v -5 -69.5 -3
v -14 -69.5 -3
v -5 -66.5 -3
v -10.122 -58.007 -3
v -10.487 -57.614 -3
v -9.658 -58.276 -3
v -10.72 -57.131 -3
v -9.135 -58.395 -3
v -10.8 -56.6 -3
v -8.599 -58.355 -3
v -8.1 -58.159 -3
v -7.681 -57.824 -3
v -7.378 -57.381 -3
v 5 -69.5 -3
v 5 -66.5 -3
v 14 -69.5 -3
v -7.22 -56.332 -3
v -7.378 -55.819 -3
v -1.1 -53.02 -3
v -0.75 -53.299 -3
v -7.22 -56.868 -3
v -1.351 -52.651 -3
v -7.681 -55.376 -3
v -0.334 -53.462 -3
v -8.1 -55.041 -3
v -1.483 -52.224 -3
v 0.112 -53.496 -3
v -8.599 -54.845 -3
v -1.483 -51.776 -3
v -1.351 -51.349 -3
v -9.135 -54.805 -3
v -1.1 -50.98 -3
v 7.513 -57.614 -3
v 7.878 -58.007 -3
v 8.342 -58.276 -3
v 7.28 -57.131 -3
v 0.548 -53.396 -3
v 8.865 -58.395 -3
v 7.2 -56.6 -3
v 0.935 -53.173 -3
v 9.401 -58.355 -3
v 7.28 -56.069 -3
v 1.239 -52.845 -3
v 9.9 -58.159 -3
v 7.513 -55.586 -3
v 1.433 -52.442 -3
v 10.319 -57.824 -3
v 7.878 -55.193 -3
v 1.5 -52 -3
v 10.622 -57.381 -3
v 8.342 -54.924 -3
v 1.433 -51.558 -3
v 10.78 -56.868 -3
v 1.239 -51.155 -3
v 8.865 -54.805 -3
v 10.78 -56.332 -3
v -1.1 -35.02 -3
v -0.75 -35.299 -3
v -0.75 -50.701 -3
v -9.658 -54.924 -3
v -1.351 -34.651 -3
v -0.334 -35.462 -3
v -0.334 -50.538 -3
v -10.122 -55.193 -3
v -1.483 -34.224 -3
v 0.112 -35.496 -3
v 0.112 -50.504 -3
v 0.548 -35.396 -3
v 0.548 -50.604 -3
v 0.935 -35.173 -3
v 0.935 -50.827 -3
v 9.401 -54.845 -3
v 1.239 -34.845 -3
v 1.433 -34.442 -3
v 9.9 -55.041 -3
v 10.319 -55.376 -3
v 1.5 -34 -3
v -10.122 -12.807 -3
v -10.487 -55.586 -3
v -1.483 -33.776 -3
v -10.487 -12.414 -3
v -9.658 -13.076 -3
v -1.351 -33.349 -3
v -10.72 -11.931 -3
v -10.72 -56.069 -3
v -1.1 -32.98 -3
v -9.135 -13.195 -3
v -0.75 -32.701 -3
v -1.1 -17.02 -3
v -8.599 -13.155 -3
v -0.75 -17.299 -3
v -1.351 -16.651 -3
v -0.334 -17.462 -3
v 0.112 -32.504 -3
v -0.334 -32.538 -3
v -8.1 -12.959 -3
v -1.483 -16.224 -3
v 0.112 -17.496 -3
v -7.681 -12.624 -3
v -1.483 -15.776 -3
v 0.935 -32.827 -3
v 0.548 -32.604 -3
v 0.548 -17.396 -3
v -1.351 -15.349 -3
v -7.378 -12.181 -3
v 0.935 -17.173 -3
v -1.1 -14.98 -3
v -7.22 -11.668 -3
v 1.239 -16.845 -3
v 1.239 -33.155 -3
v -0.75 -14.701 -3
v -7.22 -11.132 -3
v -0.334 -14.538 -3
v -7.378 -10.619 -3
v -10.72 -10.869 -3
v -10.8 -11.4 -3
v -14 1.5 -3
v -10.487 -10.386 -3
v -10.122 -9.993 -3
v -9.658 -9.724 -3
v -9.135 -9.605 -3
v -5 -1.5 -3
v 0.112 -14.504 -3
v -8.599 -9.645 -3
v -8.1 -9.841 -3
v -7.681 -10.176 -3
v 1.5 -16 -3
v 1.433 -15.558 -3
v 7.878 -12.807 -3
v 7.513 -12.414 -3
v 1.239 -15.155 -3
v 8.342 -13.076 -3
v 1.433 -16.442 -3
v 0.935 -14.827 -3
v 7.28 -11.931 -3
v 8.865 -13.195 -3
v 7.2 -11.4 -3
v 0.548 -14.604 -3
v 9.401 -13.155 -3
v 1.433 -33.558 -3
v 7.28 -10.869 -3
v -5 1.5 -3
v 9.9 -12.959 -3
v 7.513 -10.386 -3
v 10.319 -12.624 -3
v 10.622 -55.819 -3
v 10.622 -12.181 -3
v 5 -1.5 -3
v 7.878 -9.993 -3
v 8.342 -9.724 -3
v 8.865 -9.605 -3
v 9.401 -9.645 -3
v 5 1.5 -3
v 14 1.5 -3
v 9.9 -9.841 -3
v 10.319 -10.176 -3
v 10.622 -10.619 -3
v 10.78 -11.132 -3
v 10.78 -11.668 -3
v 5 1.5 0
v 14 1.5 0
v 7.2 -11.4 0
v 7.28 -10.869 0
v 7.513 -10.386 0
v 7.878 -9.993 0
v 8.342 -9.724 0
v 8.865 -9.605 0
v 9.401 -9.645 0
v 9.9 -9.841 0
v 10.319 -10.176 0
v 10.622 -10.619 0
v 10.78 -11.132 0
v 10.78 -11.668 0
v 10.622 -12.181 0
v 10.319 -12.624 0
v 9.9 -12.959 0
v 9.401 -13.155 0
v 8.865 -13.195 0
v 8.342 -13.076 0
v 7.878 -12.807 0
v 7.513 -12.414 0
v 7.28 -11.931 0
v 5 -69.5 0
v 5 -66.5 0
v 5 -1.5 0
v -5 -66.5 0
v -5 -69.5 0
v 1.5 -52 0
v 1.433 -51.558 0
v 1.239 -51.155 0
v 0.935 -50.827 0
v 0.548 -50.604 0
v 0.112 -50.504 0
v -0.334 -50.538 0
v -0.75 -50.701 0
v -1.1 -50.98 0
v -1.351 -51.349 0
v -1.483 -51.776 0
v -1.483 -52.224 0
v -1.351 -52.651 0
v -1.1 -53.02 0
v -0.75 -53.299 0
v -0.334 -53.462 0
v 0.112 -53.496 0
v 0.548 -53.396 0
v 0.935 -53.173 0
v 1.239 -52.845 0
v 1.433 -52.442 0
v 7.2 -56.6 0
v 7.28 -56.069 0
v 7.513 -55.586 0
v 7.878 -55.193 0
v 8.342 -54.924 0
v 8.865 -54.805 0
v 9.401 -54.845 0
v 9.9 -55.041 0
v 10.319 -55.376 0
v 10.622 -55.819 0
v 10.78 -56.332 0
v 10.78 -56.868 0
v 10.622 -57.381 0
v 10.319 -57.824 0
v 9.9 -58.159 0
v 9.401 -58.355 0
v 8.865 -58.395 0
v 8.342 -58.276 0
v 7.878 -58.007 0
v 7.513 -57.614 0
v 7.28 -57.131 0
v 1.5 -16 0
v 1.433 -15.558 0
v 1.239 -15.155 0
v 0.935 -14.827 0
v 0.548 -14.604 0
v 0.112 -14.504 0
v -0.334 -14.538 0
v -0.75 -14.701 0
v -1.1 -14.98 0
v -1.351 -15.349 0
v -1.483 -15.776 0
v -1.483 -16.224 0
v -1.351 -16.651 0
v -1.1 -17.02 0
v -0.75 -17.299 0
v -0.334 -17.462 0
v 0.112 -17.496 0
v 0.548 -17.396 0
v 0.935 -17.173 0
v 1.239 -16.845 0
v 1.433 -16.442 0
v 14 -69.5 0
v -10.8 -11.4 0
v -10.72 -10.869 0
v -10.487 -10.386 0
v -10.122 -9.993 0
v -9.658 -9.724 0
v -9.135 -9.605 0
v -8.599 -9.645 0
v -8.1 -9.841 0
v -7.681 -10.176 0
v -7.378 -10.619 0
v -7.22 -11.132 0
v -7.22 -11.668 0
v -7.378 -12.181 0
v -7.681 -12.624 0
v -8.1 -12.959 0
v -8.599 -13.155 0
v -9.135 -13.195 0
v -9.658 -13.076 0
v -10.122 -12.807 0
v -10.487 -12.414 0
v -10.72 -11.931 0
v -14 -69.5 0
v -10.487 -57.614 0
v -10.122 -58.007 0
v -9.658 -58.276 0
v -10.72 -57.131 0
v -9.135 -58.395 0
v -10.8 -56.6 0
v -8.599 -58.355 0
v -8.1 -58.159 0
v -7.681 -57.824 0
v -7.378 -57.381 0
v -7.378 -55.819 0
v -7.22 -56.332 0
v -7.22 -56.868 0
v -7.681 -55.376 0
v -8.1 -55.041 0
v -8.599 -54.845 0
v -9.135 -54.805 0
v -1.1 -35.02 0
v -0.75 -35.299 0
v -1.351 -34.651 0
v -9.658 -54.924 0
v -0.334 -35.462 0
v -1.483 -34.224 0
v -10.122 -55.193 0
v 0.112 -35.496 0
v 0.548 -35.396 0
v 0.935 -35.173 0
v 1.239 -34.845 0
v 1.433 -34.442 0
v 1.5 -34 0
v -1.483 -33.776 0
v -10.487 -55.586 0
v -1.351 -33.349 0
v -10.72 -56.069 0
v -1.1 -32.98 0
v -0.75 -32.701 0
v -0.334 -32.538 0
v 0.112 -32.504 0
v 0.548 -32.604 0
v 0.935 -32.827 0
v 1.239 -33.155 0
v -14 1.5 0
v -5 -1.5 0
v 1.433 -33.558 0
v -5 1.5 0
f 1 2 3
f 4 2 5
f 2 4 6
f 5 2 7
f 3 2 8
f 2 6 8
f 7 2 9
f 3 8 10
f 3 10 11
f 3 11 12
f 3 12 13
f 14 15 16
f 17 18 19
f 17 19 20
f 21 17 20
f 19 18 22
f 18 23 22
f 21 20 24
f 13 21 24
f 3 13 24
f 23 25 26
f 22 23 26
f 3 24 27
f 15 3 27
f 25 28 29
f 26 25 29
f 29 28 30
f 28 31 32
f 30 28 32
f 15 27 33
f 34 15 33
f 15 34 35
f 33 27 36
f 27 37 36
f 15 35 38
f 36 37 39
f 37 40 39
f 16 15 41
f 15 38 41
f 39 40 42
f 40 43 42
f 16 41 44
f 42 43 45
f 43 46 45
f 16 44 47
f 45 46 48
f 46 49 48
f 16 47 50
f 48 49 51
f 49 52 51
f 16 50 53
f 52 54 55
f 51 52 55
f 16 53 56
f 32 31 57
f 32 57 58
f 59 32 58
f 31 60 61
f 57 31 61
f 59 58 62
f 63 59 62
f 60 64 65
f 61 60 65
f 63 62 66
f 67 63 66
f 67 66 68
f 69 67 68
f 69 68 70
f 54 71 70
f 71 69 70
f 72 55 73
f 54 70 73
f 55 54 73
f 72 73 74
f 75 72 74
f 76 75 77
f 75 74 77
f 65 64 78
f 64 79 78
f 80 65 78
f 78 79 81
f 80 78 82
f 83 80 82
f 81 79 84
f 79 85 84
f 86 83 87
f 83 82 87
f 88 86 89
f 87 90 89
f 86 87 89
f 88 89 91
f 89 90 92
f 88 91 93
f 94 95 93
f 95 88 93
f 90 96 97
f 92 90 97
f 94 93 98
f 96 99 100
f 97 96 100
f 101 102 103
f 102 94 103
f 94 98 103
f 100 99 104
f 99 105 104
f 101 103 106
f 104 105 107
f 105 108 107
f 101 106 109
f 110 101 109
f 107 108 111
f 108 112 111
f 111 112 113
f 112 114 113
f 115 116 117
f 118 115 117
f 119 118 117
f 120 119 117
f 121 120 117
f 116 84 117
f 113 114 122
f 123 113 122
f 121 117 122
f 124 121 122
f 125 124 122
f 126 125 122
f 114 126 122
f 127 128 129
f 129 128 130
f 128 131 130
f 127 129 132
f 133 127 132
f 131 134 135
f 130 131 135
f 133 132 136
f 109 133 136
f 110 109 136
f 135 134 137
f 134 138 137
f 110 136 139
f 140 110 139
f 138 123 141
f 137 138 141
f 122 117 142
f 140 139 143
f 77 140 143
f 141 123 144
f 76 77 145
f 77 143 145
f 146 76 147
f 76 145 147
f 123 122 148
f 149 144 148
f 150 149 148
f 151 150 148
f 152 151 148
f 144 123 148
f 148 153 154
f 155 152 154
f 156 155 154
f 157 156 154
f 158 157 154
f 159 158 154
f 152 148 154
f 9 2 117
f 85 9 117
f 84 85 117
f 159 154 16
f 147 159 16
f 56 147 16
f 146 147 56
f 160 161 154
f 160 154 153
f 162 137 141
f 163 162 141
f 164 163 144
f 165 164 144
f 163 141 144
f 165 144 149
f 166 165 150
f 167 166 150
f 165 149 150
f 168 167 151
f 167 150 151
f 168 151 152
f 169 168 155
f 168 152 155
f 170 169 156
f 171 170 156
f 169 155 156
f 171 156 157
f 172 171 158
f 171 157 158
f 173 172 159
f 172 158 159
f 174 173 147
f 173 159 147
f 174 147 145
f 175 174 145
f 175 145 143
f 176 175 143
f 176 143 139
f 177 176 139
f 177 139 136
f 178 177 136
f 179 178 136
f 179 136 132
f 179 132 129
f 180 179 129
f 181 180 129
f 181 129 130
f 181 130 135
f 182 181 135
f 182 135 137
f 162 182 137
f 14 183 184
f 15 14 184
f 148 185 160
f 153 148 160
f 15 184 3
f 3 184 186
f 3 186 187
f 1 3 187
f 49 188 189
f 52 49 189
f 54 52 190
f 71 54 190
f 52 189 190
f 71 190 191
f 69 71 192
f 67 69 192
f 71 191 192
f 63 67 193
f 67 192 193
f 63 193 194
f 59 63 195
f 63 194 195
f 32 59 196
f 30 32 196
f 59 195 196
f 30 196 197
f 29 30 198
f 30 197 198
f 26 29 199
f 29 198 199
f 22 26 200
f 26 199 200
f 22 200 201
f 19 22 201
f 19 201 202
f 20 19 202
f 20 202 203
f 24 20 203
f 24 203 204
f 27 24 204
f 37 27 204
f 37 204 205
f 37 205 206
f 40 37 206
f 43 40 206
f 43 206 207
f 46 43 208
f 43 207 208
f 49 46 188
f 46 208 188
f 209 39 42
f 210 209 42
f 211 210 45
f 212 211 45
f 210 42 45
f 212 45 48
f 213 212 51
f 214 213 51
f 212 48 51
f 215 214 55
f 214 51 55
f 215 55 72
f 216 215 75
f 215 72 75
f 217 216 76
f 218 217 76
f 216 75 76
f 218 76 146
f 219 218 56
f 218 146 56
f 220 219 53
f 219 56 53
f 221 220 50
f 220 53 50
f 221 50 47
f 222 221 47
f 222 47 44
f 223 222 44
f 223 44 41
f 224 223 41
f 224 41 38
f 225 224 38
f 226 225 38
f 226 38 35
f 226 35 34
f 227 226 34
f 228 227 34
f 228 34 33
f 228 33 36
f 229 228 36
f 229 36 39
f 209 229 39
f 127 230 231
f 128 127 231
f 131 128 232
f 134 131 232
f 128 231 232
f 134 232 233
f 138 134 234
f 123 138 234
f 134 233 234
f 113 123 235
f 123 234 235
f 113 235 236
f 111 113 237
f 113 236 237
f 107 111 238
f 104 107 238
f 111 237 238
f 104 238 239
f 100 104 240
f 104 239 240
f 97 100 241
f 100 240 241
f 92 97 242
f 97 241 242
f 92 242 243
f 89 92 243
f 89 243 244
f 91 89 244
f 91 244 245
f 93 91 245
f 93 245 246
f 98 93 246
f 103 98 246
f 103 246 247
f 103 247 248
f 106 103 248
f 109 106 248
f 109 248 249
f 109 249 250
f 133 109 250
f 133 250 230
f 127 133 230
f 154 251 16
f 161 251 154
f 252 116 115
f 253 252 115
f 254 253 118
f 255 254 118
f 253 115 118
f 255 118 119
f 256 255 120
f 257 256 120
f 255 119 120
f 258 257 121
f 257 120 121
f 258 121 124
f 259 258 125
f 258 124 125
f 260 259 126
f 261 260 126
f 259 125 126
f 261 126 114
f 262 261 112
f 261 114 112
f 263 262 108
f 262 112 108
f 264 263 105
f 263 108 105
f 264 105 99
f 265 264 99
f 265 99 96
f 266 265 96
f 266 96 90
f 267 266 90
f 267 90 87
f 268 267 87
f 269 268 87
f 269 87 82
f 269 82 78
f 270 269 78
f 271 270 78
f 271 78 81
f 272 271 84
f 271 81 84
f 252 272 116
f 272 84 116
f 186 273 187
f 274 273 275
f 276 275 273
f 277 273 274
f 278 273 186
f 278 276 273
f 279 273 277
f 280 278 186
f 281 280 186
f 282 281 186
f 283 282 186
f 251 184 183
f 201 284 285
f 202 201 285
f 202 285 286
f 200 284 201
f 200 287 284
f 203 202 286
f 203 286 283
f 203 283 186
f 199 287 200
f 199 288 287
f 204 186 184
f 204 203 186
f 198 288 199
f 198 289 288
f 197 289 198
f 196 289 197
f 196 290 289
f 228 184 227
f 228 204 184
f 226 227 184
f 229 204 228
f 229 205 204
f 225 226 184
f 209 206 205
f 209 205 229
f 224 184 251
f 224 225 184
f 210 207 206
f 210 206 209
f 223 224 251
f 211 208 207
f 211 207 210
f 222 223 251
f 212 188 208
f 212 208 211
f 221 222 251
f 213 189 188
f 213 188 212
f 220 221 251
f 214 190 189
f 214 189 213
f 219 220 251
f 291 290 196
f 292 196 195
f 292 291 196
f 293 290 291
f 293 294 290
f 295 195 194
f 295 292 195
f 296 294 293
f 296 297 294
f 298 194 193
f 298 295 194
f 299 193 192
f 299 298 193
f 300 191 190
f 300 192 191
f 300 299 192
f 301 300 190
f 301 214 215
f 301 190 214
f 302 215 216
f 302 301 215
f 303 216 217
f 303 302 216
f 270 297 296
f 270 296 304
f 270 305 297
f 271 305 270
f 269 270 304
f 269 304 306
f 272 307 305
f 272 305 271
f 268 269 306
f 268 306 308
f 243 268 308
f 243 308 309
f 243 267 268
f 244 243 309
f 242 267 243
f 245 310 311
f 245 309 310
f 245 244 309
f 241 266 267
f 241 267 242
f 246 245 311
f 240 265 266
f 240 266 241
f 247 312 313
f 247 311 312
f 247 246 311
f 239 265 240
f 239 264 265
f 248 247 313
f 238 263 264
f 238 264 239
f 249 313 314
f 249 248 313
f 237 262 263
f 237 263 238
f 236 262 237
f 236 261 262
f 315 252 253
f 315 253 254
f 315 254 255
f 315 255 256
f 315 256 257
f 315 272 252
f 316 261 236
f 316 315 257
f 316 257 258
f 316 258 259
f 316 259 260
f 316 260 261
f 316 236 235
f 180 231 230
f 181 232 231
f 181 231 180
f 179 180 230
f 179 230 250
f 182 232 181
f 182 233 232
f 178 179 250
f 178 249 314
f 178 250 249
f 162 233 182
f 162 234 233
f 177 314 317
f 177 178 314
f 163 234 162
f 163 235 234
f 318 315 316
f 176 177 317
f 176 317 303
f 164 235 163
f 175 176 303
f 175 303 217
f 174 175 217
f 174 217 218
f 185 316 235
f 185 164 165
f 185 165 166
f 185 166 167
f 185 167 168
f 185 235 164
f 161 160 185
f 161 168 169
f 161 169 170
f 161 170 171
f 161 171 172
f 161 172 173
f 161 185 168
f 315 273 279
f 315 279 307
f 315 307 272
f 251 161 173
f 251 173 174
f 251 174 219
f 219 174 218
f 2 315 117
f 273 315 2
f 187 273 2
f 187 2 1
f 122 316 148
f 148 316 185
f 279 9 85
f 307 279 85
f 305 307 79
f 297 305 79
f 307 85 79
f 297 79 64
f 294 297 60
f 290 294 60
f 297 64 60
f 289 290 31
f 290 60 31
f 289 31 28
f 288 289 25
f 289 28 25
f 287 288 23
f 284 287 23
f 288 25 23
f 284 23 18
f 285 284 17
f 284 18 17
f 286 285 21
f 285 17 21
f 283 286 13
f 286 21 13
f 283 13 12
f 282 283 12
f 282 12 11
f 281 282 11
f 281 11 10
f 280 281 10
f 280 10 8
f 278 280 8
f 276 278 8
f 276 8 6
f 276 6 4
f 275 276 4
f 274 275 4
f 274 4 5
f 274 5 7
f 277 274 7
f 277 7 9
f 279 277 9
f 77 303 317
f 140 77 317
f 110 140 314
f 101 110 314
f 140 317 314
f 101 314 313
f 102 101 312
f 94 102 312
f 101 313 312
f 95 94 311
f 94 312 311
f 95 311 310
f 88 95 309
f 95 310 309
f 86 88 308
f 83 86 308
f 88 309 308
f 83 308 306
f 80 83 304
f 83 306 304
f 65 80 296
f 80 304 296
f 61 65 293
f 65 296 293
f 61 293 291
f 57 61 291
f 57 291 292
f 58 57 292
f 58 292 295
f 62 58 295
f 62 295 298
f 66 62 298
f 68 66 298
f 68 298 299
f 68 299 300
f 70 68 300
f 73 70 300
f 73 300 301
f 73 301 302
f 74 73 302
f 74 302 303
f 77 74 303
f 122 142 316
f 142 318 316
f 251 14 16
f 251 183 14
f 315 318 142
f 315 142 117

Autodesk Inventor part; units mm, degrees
ref_plane "YZ Plane" through (0, 0, 0) normal (1, 0, 0) x (0, 1, 0)
ref_plane "XZ Plane" through (0, 0, 0) normal (0, 1, 0) x (-1, 0, 0)
ref_plane "XY Plane" through (0, 0, 0) normal (0, 0, 1) x (1, 0, 0)
sketch "Sketch1" plane through (0, 0, 0) normal (0, 0, 1) x (1, 0, 0)
  line L0 (5, 1.5) -> (-5, 1.5) projected
  line L1 (-5, 1.5) -> (-5, -1.5) projected
  line L2 (-5, -1.5) -> (5, -1.5) projected
  line L3 (5, -1.5) -> (5, 1.5) projected
  line L4 (5, -66.5) -> (-5, -66.5) projected
  line L5 (-5, -66.5) -> (-5, -69.5) projected
  line L6 (-5, -69.5) -> (5, -69.5) projected
  line L7 (5, -69.5) -> (5, -66.5) projected
  line L8 (14, -1.5) -> (14, 1.5) construction
  line L9 (-14, -1.5) -> (-14, 1.5) construction
  line L10 (-14, -69.5) -> (-14, -66.5) construction
  line L11 (14, -69.5) -> (14, -66.5) construction
  line L12 (14, 1.5) -> (-14, 1.5)
  line L13 (-14, 1.5) -> (-14, -69.5)
  line L14 (-14, -69.5) -> (14, -69.5)
  line L15 (14, -69.5) -> (14, 1.5)
  point P0 (0, 0)
extrude "Extrusion1" add sketch "Sketch1" against normal blind 3 contours L12 L15 L14 L7 L4 L5 L13 L1 L2 L3
sketch "Sketch2" plane through (0, 0, 0) normal (0, 0, 1) x (1, 0, 0)
  line L0 (5, -66.5) -> (5, -69.5) construction
  line L1 (5, -69.5) -> (14, -69.5) construction
  line L2 (14, -69.5) -> (14, 1.5) construction
  line L3 (14, 1.5) -> (5, 1.5) construction
  line L4 (5, 1.5) -> (5, -1.5) construction
  line L5 (5, -1.5) -> (-5, -1.5) construction
  line L6 (-5, -1.5) -> (-5, 1.5) construction
  line L7 (-5, 1.5) -> (-14, 1.5) construction
  line L8 (-14, 1.5) -> (-14, -69.5) construction
  line L9 (-14, -69.5) -> (-5, -69.5) construction
  line L10 (-5, -69.5) -> (-5, -66.5) construction
  line L11 (-5, -66.5) -> (5, -66.5) construction
  line L12 (14, 1.5) -> (-14, -69.5) construction
  line L13 (5, -69.5) -> (14, -69.5) construction
  line L14 (-14, 1.5) -> (14, -69.5) construction
  circle A0 centre (0, -34) radius 1.5
  circle A1 centre (0, -16) radius 1.5
  circle A2 centre (0, -52) radius 1.5
  point P0 (0, 0)
  dimension "d2" = 3
  dimension "d3" = 3
  dimension "d4" = 3
  dimension "d5" = 18
  dimension "d6" = 18
extrude "Extrusion2" cut sketch "Sketch2" against normal blind 3
sketch "Sketch3" plane through (0, 0, -3) normal (0, 0, -1) x (-1, 0, 0)
  circle A0 centre (-9, -56.6) radius 1.8 projected
  circle A1 centre (-9, -11.4) radius 1.8 projected
  circle A2 centre (9, -11.4) radius 1.8 projected
  circle A3 centre (9, -56.6) radius 1.8 projected
  point P0 (0, 0)
extrude "Extrusion3" cut sketch "Sketch3" against normal blind 3
properties part number "Tilt back support with counter balance option"
